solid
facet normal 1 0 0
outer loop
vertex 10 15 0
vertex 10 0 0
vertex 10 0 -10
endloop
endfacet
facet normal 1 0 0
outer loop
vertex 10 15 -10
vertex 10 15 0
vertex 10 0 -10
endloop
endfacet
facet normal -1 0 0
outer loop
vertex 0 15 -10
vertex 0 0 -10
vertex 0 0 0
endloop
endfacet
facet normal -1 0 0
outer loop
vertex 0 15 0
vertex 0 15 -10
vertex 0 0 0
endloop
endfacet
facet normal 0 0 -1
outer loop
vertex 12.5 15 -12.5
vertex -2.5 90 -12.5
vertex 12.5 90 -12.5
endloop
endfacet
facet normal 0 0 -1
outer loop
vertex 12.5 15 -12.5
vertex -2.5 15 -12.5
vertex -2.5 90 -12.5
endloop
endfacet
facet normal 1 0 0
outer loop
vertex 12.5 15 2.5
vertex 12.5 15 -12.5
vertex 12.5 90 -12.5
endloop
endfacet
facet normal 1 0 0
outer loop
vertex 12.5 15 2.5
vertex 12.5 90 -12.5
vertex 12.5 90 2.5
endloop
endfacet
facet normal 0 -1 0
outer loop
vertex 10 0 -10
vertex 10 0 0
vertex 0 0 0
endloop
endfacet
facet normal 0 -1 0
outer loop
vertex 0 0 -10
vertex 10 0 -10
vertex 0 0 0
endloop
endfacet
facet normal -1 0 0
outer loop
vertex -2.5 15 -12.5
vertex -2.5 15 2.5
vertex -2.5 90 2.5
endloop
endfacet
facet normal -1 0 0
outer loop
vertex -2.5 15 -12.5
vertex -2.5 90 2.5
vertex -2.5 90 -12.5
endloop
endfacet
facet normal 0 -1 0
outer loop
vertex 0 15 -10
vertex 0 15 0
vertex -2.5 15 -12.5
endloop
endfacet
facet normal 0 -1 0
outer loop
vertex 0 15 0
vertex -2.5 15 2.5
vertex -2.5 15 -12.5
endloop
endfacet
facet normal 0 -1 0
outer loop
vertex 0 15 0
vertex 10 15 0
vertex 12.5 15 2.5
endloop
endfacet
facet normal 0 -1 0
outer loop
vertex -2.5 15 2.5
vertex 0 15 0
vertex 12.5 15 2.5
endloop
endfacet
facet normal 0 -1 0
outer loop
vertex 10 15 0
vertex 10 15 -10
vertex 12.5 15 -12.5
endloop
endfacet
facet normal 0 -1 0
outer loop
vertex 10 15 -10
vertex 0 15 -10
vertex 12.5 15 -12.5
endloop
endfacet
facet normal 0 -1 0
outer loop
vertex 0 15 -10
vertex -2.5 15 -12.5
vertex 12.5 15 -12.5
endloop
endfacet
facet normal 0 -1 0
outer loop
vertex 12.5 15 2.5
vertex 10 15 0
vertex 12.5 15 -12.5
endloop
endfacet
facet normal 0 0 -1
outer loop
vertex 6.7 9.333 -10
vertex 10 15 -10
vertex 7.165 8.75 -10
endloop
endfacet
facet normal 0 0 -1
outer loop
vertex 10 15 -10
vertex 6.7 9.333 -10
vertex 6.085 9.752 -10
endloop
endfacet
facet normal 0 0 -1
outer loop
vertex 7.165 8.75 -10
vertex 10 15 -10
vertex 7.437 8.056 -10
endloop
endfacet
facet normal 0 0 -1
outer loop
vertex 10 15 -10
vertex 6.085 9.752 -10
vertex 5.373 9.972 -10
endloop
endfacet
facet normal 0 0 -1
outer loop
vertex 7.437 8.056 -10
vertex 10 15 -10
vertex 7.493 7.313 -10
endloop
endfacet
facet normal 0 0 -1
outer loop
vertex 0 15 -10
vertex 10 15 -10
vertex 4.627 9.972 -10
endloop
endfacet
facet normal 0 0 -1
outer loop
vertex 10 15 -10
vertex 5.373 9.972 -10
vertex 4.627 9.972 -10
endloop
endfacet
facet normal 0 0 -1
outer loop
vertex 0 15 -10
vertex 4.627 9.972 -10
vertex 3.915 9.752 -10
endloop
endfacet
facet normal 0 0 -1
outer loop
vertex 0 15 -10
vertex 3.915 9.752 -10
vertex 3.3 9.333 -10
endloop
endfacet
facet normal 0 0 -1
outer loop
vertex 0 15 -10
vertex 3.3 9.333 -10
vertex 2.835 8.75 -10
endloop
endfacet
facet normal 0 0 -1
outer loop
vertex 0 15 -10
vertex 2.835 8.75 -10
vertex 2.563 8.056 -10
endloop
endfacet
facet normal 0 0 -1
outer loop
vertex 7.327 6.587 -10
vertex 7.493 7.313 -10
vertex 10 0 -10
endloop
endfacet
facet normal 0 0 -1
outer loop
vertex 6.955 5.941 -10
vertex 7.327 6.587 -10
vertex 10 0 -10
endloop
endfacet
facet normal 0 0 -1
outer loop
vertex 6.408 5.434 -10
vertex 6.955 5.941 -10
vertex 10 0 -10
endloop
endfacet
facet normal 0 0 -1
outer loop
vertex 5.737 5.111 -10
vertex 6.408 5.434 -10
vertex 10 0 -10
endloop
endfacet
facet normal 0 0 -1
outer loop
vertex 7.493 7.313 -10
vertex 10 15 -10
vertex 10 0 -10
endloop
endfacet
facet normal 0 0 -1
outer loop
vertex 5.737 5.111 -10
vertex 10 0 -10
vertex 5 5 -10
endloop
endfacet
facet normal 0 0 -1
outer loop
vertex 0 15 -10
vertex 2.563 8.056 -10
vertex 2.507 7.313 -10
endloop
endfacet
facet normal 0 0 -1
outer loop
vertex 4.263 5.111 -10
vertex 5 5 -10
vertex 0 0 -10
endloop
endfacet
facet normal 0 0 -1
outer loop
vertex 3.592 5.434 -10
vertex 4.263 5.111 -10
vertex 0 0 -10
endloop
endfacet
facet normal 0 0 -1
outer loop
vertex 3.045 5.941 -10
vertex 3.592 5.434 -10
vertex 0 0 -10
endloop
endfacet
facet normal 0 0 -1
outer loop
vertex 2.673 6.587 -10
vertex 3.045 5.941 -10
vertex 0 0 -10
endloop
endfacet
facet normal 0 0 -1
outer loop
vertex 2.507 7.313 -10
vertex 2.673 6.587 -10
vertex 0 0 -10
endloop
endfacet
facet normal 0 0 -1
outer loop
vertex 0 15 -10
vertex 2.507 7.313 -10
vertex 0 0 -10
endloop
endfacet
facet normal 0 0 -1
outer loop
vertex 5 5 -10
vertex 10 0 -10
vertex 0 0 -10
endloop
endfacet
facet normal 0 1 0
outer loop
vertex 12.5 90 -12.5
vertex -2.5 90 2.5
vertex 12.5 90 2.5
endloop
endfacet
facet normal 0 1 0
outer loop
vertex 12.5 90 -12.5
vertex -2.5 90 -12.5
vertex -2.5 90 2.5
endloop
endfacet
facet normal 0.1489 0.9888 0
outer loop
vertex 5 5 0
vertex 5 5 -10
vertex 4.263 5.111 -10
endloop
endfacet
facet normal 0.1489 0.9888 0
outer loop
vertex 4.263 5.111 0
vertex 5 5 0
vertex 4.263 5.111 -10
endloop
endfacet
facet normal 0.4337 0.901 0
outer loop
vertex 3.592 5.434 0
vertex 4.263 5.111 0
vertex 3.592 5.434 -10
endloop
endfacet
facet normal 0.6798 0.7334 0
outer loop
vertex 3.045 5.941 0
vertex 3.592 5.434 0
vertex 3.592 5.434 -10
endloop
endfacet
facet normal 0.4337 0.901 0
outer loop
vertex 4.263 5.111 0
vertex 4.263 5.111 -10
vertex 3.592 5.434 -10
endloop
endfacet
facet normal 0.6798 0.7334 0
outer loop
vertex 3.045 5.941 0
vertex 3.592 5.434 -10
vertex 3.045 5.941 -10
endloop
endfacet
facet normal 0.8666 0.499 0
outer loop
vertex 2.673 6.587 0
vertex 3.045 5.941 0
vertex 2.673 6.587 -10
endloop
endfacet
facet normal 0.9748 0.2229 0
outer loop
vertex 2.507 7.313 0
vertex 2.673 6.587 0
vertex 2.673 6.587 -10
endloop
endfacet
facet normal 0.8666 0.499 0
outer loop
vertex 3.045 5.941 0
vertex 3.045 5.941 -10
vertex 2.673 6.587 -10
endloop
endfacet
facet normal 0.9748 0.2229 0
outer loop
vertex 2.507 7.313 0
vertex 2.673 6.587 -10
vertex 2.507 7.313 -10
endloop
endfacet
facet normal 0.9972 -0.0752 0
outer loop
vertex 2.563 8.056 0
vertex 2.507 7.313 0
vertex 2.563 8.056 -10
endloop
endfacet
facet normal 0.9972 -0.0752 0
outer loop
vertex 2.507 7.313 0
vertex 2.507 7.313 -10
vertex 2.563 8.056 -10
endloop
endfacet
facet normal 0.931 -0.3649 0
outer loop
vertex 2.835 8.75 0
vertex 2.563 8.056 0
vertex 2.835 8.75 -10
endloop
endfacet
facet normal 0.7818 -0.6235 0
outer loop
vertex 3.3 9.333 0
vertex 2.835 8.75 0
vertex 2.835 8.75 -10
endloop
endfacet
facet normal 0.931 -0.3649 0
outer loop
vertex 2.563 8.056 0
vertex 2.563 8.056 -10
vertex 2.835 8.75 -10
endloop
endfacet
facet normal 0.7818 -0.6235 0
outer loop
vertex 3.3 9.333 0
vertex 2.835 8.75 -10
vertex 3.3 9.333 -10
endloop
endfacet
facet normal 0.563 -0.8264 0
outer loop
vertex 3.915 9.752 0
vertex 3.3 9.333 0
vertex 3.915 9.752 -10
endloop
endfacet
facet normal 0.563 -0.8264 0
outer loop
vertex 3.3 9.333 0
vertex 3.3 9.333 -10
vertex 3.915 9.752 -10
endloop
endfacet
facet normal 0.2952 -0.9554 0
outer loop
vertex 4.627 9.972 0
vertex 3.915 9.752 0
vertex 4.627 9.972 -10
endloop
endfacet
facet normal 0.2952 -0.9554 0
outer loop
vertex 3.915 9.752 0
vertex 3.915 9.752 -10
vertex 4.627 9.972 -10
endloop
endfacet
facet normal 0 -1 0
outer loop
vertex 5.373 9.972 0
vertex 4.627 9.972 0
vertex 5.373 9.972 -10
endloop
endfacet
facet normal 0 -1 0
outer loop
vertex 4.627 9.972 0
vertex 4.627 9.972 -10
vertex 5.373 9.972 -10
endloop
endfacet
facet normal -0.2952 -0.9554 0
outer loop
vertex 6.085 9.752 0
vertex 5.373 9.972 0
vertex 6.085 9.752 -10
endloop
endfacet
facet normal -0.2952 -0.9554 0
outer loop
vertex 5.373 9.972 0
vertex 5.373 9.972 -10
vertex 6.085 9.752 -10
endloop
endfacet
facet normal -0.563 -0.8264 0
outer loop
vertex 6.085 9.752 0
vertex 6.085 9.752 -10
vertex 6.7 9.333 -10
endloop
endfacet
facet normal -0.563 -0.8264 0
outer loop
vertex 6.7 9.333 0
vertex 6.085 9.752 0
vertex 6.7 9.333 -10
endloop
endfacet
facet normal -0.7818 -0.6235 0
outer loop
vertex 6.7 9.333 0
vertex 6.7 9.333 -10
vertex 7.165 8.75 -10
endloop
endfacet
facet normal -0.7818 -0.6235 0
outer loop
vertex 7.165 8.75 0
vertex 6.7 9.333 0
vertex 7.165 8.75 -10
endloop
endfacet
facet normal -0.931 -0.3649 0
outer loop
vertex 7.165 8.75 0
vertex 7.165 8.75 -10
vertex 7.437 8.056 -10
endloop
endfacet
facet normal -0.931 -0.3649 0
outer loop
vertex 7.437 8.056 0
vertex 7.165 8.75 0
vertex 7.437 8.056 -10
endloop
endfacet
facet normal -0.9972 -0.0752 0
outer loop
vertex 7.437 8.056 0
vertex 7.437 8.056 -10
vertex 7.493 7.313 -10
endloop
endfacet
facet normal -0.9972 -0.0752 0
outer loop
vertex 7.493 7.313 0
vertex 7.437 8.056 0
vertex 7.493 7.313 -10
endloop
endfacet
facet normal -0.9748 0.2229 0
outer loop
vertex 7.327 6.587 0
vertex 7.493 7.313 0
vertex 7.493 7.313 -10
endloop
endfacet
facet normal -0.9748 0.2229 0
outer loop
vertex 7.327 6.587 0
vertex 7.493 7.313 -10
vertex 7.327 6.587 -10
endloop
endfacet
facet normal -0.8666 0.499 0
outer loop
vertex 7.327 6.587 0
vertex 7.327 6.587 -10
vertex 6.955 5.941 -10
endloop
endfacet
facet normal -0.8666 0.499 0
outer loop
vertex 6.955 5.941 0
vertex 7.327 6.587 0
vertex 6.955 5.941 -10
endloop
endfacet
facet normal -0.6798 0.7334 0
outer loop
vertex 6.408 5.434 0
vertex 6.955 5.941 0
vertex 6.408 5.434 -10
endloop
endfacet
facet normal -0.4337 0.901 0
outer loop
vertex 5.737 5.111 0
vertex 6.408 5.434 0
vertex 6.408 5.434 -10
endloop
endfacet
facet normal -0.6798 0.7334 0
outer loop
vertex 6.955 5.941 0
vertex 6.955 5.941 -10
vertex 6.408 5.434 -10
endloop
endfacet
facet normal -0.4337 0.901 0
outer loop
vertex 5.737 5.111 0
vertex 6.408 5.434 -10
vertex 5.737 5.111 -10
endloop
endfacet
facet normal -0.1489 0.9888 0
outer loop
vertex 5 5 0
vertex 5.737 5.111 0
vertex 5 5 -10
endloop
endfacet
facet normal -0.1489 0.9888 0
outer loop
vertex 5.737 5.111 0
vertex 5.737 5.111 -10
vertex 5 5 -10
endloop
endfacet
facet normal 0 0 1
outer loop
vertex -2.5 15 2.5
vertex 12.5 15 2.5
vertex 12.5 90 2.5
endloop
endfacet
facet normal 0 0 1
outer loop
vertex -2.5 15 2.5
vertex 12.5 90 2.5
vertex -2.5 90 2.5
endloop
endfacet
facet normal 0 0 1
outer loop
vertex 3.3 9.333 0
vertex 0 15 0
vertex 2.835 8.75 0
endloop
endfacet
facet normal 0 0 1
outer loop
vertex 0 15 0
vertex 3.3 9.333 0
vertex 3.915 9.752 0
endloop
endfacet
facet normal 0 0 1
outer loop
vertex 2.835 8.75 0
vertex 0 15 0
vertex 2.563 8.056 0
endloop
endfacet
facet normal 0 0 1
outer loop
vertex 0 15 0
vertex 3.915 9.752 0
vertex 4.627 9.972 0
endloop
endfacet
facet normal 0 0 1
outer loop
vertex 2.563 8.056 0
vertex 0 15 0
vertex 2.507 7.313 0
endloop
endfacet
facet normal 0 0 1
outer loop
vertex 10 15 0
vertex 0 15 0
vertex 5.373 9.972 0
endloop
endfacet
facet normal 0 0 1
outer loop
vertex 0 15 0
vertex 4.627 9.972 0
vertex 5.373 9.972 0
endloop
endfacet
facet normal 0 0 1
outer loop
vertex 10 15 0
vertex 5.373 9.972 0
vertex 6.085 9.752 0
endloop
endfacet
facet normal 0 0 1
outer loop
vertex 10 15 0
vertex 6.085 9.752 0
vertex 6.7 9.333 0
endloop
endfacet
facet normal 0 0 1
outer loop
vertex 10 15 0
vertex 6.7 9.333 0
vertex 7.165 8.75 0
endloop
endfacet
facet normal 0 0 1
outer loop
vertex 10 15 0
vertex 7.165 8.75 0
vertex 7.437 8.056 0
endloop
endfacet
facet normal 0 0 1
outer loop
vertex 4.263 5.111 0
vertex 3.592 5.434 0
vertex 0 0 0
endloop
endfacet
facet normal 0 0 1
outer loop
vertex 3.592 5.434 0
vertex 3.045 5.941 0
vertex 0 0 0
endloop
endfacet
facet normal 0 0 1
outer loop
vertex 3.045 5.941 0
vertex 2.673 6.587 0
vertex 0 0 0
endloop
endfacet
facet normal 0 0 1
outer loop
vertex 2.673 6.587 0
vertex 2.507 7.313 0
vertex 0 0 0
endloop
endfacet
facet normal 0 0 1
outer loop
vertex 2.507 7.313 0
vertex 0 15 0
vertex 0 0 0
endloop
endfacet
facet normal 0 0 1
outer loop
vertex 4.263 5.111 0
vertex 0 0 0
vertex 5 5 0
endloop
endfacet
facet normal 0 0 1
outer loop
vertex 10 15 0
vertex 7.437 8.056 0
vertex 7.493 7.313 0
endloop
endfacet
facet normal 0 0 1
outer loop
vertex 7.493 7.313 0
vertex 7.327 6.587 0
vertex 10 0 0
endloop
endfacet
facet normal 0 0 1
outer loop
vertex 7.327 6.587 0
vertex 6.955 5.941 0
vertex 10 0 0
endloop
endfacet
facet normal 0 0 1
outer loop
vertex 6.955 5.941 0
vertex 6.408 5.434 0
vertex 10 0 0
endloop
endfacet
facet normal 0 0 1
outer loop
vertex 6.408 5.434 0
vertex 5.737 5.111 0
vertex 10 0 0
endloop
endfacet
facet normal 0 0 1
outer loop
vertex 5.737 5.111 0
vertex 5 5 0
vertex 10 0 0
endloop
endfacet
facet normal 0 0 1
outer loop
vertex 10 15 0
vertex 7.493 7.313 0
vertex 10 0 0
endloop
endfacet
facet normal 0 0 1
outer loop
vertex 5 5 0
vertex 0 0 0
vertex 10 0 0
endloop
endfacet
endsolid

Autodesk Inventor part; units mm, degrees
ref_plane "YZ Plane" through (0, 0, 0) normal (1, 0, 0) x (0, 1, 0)
ref_plane "XZ Plane" through (0, 0, 0) normal (0, 1, 0) x (-1, 0, 0)
ref_plane "XY Plane" through (0, 0, 0) normal (0, 0, 1) x (1, 0, 0)
sketch "Sketch1" plane through (0, 0, 0) normal (0, 1, 0) x (-1, 0, 0)
  line L0 (0, 0) -> (-10, 0)
  line L1 (-10, 0) -> (-10, -10)
  line L2 (-10, -10) -> (0, -10)
  line L3 (0, -10) -> (0, 0)
  dimension "d0" = 10
  dimension "d1" = 10
extrude "Extrusion1" add sketch "Sketch1" along normal blind 15
sketch "Sketch2" plane through (0, 15, 0) normal (0, 1, 0) x (1, 0, 0)
  line L0 (12.5, -2.5) -> (-2.5, -2.5)
  line L1 (-2.5, -2.5) -> (-2.5, 12.5)
  line L2 (-2.5, 12.5) -> (12.5, 12.5)
  line L3 (12.5, 12.5) -> (12.5, -2.5)
  line L4 (12.5, -2.5) -> (-2.5, 12.5) construction
  line L5 (-2.5, -2.5) -> (12.5, 12.5) construction
  point P0 (0, 0)
  point P1 (5, 5)
  dimension "d4" = 15
  dimension "d5" = 15
extrude "Extrusion2" add sketch "Sketch2" along normal blind 75
sketch "Sketch3" plane through (0, 0, 0) normal (0, 0, 1) x (1, 0, 0)
  line L0 (0, 0) -> (0, 15) projected
  line L1 (0, 7.5) -> (10, 7.5)
  line L2 (10, 0) -> (10, 15) projected
  line L3 (-2.5, 15) -> (12.5, 15) projected
  line L4 (5, 15) -> (5, 0)
  line L5 (0, 0) -> (10, 0) projected
  point P0 (5, 7.5)
hole "Hole1" at (5, 7.5, 0) direction (0, 0, -1) diameter 5 end through all
properties part number "Pendulum"
